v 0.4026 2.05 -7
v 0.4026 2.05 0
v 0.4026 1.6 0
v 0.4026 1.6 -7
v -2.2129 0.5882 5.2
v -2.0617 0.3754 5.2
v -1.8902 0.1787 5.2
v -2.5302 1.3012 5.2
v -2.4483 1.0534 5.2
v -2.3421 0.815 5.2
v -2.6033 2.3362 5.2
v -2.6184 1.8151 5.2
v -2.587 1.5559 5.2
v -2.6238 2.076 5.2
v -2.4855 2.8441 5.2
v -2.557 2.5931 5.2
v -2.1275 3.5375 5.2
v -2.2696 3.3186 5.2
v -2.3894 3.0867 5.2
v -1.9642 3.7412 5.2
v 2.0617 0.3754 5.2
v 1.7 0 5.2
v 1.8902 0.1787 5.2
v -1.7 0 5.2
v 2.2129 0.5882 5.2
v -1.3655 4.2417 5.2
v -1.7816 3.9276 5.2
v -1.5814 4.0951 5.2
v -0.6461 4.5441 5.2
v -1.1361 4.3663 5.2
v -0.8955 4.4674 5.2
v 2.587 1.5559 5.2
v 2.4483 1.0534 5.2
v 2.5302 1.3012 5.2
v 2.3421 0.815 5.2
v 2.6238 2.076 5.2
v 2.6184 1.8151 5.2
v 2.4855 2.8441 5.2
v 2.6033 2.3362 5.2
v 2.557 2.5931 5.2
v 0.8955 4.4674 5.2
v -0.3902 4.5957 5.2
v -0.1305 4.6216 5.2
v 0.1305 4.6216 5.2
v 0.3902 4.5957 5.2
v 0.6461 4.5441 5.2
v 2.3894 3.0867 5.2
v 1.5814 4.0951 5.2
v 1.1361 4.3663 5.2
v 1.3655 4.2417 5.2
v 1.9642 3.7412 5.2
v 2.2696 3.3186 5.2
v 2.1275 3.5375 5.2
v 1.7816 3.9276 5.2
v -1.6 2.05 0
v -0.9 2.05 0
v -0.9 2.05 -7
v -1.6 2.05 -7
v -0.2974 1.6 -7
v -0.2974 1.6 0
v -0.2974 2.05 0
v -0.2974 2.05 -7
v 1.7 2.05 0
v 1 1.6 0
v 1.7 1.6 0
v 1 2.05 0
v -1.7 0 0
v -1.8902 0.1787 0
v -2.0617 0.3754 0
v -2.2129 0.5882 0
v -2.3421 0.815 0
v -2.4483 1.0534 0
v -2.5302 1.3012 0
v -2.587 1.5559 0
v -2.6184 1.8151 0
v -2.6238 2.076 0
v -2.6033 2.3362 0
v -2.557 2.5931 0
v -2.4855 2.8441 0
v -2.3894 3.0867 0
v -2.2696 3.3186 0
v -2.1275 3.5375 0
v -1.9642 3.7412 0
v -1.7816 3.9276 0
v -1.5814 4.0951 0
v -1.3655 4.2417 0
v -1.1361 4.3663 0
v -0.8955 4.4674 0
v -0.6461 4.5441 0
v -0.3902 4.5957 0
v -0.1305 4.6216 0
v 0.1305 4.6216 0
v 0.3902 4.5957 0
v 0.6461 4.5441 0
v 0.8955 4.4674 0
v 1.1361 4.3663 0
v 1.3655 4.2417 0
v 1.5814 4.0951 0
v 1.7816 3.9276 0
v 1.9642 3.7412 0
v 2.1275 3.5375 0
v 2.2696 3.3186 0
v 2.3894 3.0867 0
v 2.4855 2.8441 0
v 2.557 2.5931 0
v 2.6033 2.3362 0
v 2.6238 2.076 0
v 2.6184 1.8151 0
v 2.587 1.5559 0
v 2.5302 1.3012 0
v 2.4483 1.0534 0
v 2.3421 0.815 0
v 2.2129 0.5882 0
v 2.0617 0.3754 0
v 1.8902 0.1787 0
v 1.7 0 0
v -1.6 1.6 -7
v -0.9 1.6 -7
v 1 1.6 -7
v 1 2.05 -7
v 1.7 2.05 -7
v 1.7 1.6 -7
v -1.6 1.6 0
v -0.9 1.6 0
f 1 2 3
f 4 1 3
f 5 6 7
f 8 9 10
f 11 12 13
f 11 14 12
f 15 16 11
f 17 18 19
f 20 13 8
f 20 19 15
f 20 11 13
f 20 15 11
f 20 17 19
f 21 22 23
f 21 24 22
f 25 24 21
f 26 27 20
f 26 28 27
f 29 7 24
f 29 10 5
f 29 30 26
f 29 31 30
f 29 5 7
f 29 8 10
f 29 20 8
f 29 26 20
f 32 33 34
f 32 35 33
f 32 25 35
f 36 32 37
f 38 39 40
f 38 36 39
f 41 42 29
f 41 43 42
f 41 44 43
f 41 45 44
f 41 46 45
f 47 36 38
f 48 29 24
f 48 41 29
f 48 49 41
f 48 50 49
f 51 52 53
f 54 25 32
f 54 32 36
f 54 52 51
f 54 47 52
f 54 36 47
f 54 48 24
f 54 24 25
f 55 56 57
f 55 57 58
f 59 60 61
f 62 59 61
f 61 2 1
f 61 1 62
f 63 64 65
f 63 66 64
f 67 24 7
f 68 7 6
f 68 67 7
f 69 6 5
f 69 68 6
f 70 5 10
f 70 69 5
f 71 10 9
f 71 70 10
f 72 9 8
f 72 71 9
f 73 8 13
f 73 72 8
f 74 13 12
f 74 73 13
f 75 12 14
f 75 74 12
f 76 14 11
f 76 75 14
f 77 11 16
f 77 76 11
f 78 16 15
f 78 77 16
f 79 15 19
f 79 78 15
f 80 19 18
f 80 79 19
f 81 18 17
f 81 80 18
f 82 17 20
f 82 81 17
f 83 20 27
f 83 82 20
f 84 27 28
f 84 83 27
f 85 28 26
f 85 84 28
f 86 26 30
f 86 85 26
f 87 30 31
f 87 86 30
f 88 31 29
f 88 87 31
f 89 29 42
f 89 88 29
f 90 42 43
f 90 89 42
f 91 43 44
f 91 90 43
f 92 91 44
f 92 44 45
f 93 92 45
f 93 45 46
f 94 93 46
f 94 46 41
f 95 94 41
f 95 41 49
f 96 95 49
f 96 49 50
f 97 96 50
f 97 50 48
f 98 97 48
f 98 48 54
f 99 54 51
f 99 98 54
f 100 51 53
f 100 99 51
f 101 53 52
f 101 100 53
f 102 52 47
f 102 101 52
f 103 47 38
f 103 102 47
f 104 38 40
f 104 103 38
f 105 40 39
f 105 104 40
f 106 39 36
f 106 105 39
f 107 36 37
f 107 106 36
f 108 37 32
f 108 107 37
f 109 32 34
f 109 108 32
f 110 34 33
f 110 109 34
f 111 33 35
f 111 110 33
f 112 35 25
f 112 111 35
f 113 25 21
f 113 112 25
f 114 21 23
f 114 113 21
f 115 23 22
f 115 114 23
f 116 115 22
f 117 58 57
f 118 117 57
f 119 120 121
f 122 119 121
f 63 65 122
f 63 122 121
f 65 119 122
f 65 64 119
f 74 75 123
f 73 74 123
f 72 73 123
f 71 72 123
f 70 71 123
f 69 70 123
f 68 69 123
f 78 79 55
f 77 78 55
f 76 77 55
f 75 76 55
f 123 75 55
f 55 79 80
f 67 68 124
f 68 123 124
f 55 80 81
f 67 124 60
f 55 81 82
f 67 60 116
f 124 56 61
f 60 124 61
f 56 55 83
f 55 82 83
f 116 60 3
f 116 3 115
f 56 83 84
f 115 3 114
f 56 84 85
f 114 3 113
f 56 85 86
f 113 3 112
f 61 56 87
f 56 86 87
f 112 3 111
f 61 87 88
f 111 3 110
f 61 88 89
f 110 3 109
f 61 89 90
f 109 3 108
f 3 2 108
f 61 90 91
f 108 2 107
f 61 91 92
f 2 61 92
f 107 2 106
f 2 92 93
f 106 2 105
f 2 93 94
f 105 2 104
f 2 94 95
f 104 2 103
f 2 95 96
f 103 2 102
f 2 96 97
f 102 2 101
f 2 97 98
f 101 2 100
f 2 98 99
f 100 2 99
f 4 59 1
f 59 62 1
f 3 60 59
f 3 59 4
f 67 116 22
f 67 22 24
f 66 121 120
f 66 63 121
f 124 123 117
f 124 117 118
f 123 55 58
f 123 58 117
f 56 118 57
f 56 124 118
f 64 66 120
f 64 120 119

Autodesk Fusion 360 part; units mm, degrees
sketch "Sketch1" plane through (0, 0, 0) normal (0, 0, 1) x (1, 0, 0)
  line L0 (0, 0) -> (-1.725, 0)
  line L1 (-1.725, 0) -> (-1.725, 0.0215)
  line L2 (1.725, 0) -> (1.725, 0.0215)
  line L3 (0, 0) -> (1.725, 0)
  arc A0 (1.7, 0) -> (-1.7, 0) centre (0, 2) ccw
  line L4 (-1.6, 1.6) -> (1.7, 1.6)
  line L5 (1.7, 1.6) -> (1.7, 2.05)
  line L6 (1.7, 2.05) -> (-1.6, 2.05)
  line L7 (-1.6, 2.05) -> (-1.6, 1.6)
  line L8 (-1.6, 1.6) -> (-0.9, 1.6)
  line L9 (-0.9, 1.6) -> (-0.9, 2.05)
  line L10 (-0.9, 2.05) -> (-1.6, 2.05)
  line L11 (-1.6, 2.05) -> (-1.6, 1.6)
  line L12 (1.7, 2.05) -> (1, 2.05)
  line L13 (1, 2.05) -> (1, 1.6)
  line L14 (1, 1.6) -> (1.7, 1.6)
  line L15 (1.7, 1.6) -> (1.7, 2.05)
  line L16 (-0.2974, 2.05) -> (0.4026, 2.05)
  line L17 (0.4026, 2.05) -> (0.4026, 1.6)
  line L18 (0.4026, 1.6) -> (-0.2974, 1.6)
  line L19 (-0.2974, 1.6) -> (-0.2974, 2.05)
  dimension "d7" = 3.3
  dimension "d8" = 0.45
  dimension "d9" = 0.7
  dimension "d10" = 0.7
  dimension "d11" = 0.7
extrude "Extrude2" add sketch "Sketch1" against normal blind 7 contours L4 L5 L6 L12 L13 L14 L15 makes body 1
extrude "Extrude1" add sketch "Sketch1" along normal blind 5.2 separate body contours L0 L3 A0 | L4 L6 L7 L8 L9 L10 L11 | L4 L6 L9 L19 | L4 L6 L16 L17 L18 L19 | L4 L6 L13 L17 | L4 L5 L6 L12 L13 L14 L15 makes body 2
extrude "Extrude3" add sketch "Sketch1" against normal blind 7 contours L4 L6 L16 L17 L18 L19 bodies 2
extrude "Extrude4" add sketch "Sketch1" against normal blind 7 contours L4 L6 L7 L8 L9 L10 L11 bodies 2
sketch "Sketch2" plane through (0, 0, 0) normal (0, -1, 0) x (1, 0, 0)
  line L0 (-1.7, 0) -> (1.7, 0)
  line L1 (1.7, 0) -> (1.7, 5.2)
  line L2 (1.7, 5.2) -> (-1.7, 5.2)
  line L3 (-1.7, 5.2) -> (-1.7, 0)
  line L4 (-1.3801, 3.7908) -> (-1.3801, 4.4908)
  line L5 (-1.3801, 4.4908) -> (-1.1175, 4.4908)
  spline S0 degree 2 poles (-1.1175, 4.4908) (-1.0373, 4.4908) (-0.9888, 4.4696) knots 0 0 0 1 1 1
  spline S1 degree 2 poles (-0.9888, 4.4696) (-0.9403, 4.4483) (-0.9129, 4.4042) knots 0 0 0 1 1 1
  spline S2 degree 2 poles (-0.9129, 4.4042) (-0.8854, 4.36) (-0.8854, 4.3118) knots 0 0 0 1 1 1
  spline S3 degree 2 poles (-0.8854, 4.3118) (-0.8854, 4.2669) (-0.9098, 4.2273) knots 0 0 0 1 1 1
  spline S4 degree 2 poles (-0.9098, 4.2273) (-0.9341, 4.1876) (-0.9833, 4.1633) knots 0 0 0 1 1 1
  spline S5 degree 2 poles (-0.9833, 4.1633) (-0.9198, 4.1447) (-0.8857, 4.0998) knots 0 0 0 1 1 1
  spline S6 degree 2 poles (-0.8857, 4.0998) (-0.8515, 4.0549) (-0.8515, 3.9938) knots 0 0 0 1 1 1
  spline S7 degree 2 poles (-0.8515, 3.9938) (-0.8515, 3.9446) (-0.8723, 3.9023) knots 0 0 0 1 1 1
  spline S8 degree 2 poles (-0.8723, 3.9023) (-0.8931, 3.8601) (-0.9236, 3.8372) knots 0 0 0 1 1 1
  spline S9 degree 2 poles (-0.9236, 3.8372) (-0.9542, 3.8142) (-1.0003, 3.8025) knots 0 0 0 1 1 1
  spline S10 degree 2 poles (-1.0003, 3.8025) (-1.0463, 3.7908) (-1.1132, 3.7908) knots 0 0 0 1 1 1
  line L6 (-1.1132, 3.7908) -> (-1.3801, 3.7908)
  line L7 (-1.2875, 4.1967) -> (-1.1361, 4.1967)
  spline S11 degree 2 poles (-1.1361, 4.1967) (-1.0745, 4.1967) (-1.0478, 4.2048) knots 0 0 0 1 1 1
  spline S12 degree 2 poles (-1.0478, 4.2048) (-1.0124, 4.2153) (-0.9945, 4.2397) knots 0 0 0 1 1 1
  spline S13 degree 2 poles (-0.9945, 4.2397) (-0.9766, 4.264) (-0.9766, 4.3008) knots 0 0 0 1 1 1
  spline S14 degree 2 poles (-0.9766, 4.3008) (-0.9766, 4.3357) (-0.9933, 4.3622) knots 0 0 0 1 1 1
  spline S15 degree 2 poles (-0.9933, 4.3622) (-1.01, 4.3887) (-1.0411, 4.3984) knots 0 0 0 1 1 1
  spline S16 degree 2 poles (-1.0411, 4.3984) (-1.0721, 4.4082) (-1.1476, 4.4082) knots 0 0 0 1 1 1
  line L8 (-1.1476, 4.4082) -> (-1.2875, 4.4082)
  line L9 (-1.2875, 4.4082) -> (-1.2875, 4.1967)
  line L10 (-1.2875, 3.8734) -> (-1.1132, 3.8734)
  spline S17 degree 2 poles (-1.1132, 3.8734) (-1.0683, 3.8734) (-1.0502, 3.8768) knots 0 0 0 1 1 1
  spline S18 degree 2 poles (-1.0502, 3.8768) (-1.0182, 3.8825) (-0.9967, 3.8959) knots 0 0 0 1 1 1
  spline S19 degree 2 poles (-0.9967, 3.8959) (-0.9752, 3.9093) (-0.9613, 3.9348) knots 0 0 0 1 1 1
  spline S20 degree 2 poles (-0.9613, 3.9348) (-0.9475, 3.9603) (-0.9475, 3.9938) knots 0 0 0 1 1 1
  spline S21 degree 2 poles (-0.9475, 3.9938) (-0.9475, 4.0329) (-0.9676, 4.0618) knots 0 0 0 1 1 1
  spline S22 degree 2 poles (-0.9676, 4.0618) (-0.9876, 4.0907) (-1.0232, 4.1024) knots 0 0 0 1 1 1
  spline S23 degree 2 poles (-1.0232, 4.1024) (-1.0588, 4.1141) (-1.1256, 4.1141) knots 0 0 0 1 1 1
  line L11 (-1.1256, 4.1141) -> (-1.2875, 4.1141)
  line L12 (-1.2875, 4.1141) -> (-1.2875, 3.8734)
  line L13 (-0.2246, 4.0363) -> (-0.1319, 4.0129)
  spline S24 degree 2 poles (-0.1319, 4.0129) (-0.1611, 3.8988) (-0.2368, 3.8388) knots 0 0 0 1 1 1
  spline S25 degree 2 poles (-0.2368, 3.8388) (-0.3124, 3.7789) (-0.4218, 3.7789) knots 0 0 0 1 1 1
  spline S26 degree 2 poles (-0.4218, 3.7789) (-0.5349, 3.7789) (-0.6059, 3.825) knots 0 0 0 1 1 1
  spline S27 degree 2 poles (-0.6059, 3.825) (-0.6768, 3.8711) (-0.7138, 3.9584) knots 0 0 0 1 1 1
  spline S28 degree 2 poles (-0.7138, 3.9584) (-0.7508, 4.0458) (-0.7508, 4.1461) knots 0 0 0 1 1 1
  spline S29 degree 2 poles (-0.7508, 4.1461) (-0.7508, 4.2554) (-0.709, 4.3368) knots 0 0 0 1 1 1
  spline S30 degree 2 poles (-0.709, 4.3368) (-0.6672, 4.4183) (-0.5901, 4.4605) knots 0 0 0 1 1 1
  spline S31 degree 2 poles (-0.5901, 4.4605) (-0.513, 4.5028) (-0.4203, 4.5028) knots 0 0 0 1 1 1
  spline S32 degree 2 poles (-0.4203, 4.5028) (-0.3153, 4.5028) (-0.2437, 4.4493) knots 0 0 0 1 1 1
  spline S33 degree 2 poles (-0.2437, 4.4493) (-0.1721, 4.3958) (-0.1439, 4.2989) knots 0 0 0 1 1 1
  line L14 (-0.1439, 4.2989) -> (-0.2351, 4.2774)
  spline S34 degree 2 poles (-0.2351, 4.2774) (-0.2594, 4.3538) (-0.3058, 4.3887) knots 0 0 0 1 1 1
  spline S35 degree 2 poles (-0.3058, 4.3887) (-0.3521, 4.4235) (-0.4223, 4.4235) knots 0 0 0 1 1 1
  spline S36 degree 2 poles (-0.4223, 4.4235) (-0.503, 4.4235) (-0.5571, 4.3848) knots 0 0 0 1 1 1
  spline S37 degree 2 poles (-0.5571, 4.3848) (-0.6113, 4.3462) (-0.6333, 4.281) knots 0 0 0 1 1 1
  spline S38 degree 2 poles (-0.6333, 4.281) (-0.6553, 4.2158) (-0.6553, 4.1466) knots 0 0 0 1 1 1
  spline S39 degree 2 poles (-0.6553, 4.1466) (-0.6553, 4.0573) (-0.6292, 3.9907) knots 0 0 0 1 1 1
  spline S40 degree 2 poles (-0.6292, 3.9907) (-0.6032, 3.9241) (-0.5483, 3.8911) knots 0 0 0 1 1 1
  spline S41 degree 2 poles (-0.5483, 3.8911) (-0.4934, 3.8582) (-0.4294, 3.8582) knots 0 0 0 1 1 1
  spline S42 degree 2 poles (-0.4294, 3.8582) (-0.3516, 3.8582) (-0.2976, 3.903) knots 0 0 0 1 1 1
  spline S43 degree 2 poles (-0.2976, 3.903) (-0.2437, 3.9479) (-0.2246, 4.0363) knots 0 0 0 1 1 1
  line L15 (-0.0522, 3.9756) -> (0.0337, 3.9871)
  spline S44 degree 2 poles (0.0337, 3.9871) (0.0485, 3.914) (0.0841, 3.8818) knots 0 0 0 1 1 1
  spline S45 degree 2 poles (0.0841, 3.8818) (0.1197, 3.8496) (0.1708, 3.8496) knots 0 0 0 1 1 1
  spline S46 degree 2 poles (0.1708, 3.8496) (0.2314, 3.8496) (0.2732, 3.8916) knots 0 0 0 1 1 1
  spline S47 degree 2 poles (0.2732, 3.8916) (0.315, 3.9336) (0.315, 3.9957) knots 0 0 0 1 1 1
  spline S48 degree 2 poles (0.315, 3.9957) (0.315, 4.0549) (0.2763, 4.0933) knots 0 0 0 1 1 1
  spline S49 degree 2 poles (0.2763, 4.0933) (0.2376, 4.1318) (0.1779, 4.1318) knots 0 0 0 1 1 1
  spline S50 degree 2 poles (0.1779, 4.1318) (0.1536, 4.1318) (0.1173, 4.1222) knots 0 0 0 1 1 1
  line L16 (0.1173, 4.1222) -> (0.1269, 4.1977)
  spline S51 degree 2 poles (0.1269, 4.1977) (0.1355, 4.1967) (0.1407, 4.1967) knots 0 0 0 1 1 1
  spline S52 degree 2 poles (0.1407, 4.1967) (0.1956, 4.1967) (0.2395, 4.2254) knots 0 0 0 1 1 1
  spline S53 degree 2 poles (0.2395, 4.2254) (0.2835, 4.254) (0.2835, 4.3137) knots 0 0 0 1 1 1
  spline S54 degree 2 poles (0.2835, 4.3137) (0.2835, 4.361) (0.2515, 4.392) knots 0 0 0 1 1 1
  spline S55 degree 2 poles (0.2515, 4.392) (0.2195, 4.423) (0.1689, 4.423) knots 0 0 0 1 1 1
  spline S56 degree 2 poles (0.1689, 4.423) (0.1187, 4.423) (0.0853, 4.3915) knots 0 0 0 1 1 1
  spline S57 degree 2 poles (0.0853, 4.3915) (0.0519, 4.36) (0.0423, 4.297) knots 0 0 0 1 1 1
  line L17 (0.0423, 4.297) -> (-0.0436, 4.3123)
  spline S58 degree 2 poles (-0.0436, 4.3123) (-0.0279, 4.3987) (0.028, 4.4462) knots 0 0 0 1 1 1
  spline S59 degree 2 poles (0.028, 4.4462) (0.0839, 4.4937) (0.167, 4.4937) knots 0 0 0 1 1 1
  spline S60 degree 2 poles (0.167, 4.4937) (0.2243, 4.4937) (0.2725, 4.4691) knots 0 0 0 1 1 1
  spline S61 degree 2 poles (0.2725, 4.4691) (0.3207, 4.4445) (0.3463, 4.402) knots 0 0 0 1 1 1
  spline S62 degree 2 poles (0.3463, 4.402) (0.3718, 4.3595) (0.3718, 4.3118) knots 0 0 0 1 1 1
  spline S63 degree 2 poles (0.3718, 4.3118) (0.3718, 4.2664) (0.3475, 4.2292) knots 0 0 0 1 1 1
  spline S64 degree 2 poles (0.3475, 4.2292) (0.3231, 4.1919) (0.2754, 4.17) knots 0 0 0 1 1 1
  spline S65 degree 2 poles (0.2754, 4.17) (0.3374, 4.1556) (0.3718, 4.1105) knots 0 0 0 1 1 1
  spline S66 degree 2 poles (0.3718, 4.1105) (0.4062, 4.0654) (0.4062, 3.9976) knots 0 0 0 1 1 1
  spline S67 degree 2 poles (0.4062, 3.9976) (0.4062, 3.9059) (0.3393, 3.8422) knots 0 0 0 1 1 1
  spline S68 degree 2 poles (0.3393, 3.8422) (0.2725, 3.7784) (0.1703, 3.7784) knots 0 0 0 1 1 1
  spline S69 degree 2 poles (0.1703, 3.7784) (0.0782, 3.7784) (0.0173, 3.8333) knots 0 0 0 1 1 1
  spline S70 degree 2 poles (0.0173, 3.8333) (-0.0436, 3.8882) (-0.0522, 3.9756) knots 0 0 0 1 1 1
  line L18 (0.4917, 3.9756) -> (0.5776, 3.9871)
  spline S71 degree 2 poles (0.5776, 3.9871) (0.5924, 3.914) (0.628, 3.8818) knots 0 0 0 1 1 1
  spline S72 degree 2 poles (0.628, 3.8818) (0.6636, 3.8496) (0.7146, 3.8496) knots 0 0 0 1 1 1
  spline S73 degree 2 poles (0.7146, 3.8496) (0.7753, 3.8496) (0.8171, 3.8916) knots 0 0 0 1 1 1
  spline S74 degree 2 poles (0.8171, 3.8916) (0.8588, 3.9336) (0.8588, 3.9957) knots 0 0 0 1 1 1
  spline S75 degree 2 poles (0.8588, 3.9957) (0.8588, 4.0549) (0.8202, 4.0933) knots 0 0 0 1 1 1
  spline S76 degree 2 poles (0.8202, 4.0933) (0.7815, 4.1318) (0.7218, 4.1318) knots 0 0 0 1 1 1
  spline S77 degree 2 poles (0.7218, 4.1318) (0.6975, 4.1318) (0.6612, 4.1222) knots 0 0 0 1 1 1
  line L19 (0.6612, 4.1222) -> (0.6707, 4.1977)
  spline S78 degree 2 poles (0.6707, 4.1977) (0.6793, 4.1967) (0.6846, 4.1967) knots 0 0 0 1 1 1
  spline S79 degree 2 poles (0.6846, 4.1967) (0.7395, 4.1967) (0.7834, 4.2254) knots 0 0 0 1 1 1
  spline S80 degree 2 poles (0.7834, 4.2254) (0.8273, 4.254) (0.8273, 4.3137) knots 0 0 0 1 1 1
  spline S81 degree 2 poles (0.8273, 4.3137) (0.8273, 4.361) (0.7953, 4.392) knots 0 0 0 1 1 1
  spline S82 degree 2 poles (0.7953, 4.392) (0.7633, 4.423) (0.7127, 4.423) knots 0 0 0 1 1 1
  spline S83 degree 2 poles (0.7127, 4.423) (0.6626, 4.423) (0.6292, 4.3915) knots 0 0 0 1 1 1
  spline S84 degree 2 poles (0.6292, 4.3915) (0.5958, 4.36) (0.5862, 4.297) knots 0 0 0 1 1 1
  line L20 (0.5862, 4.297) -> (0.5003, 4.3123)
  spline S85 degree 2 poles (0.5003, 4.3123) (0.516, 4.3987) (0.5719, 4.4462) knots 0 0 0 1 1 1
  spline S86 degree 2 poles (0.5719, 4.4462) (0.6277, 4.4937) (0.7108, 4.4937) knots 0 0 0 1 1 1
  spline S87 degree 2 poles (0.7108, 4.4937) (0.7681, 4.4937) (0.8164, 4.4691) knots 0 0 0 1 1 1
  spline S88 degree 2 poles (0.8164, 4.4691) (0.8646, 4.4445) (0.8901, 4.402) knots 0 0 0 1 1 1
  spline S89 degree 2 poles (0.8901, 4.402) (0.9157, 4.3595) (0.9157, 4.3118) knots 0 0 0 1 1 1
  spline S90 degree 2 poles (0.9157, 4.3118) (0.9157, 4.2664) (0.8913, 4.2292) knots 0 0 0 1 1 1
  spline S91 degree 2 poles (0.8913, 4.2292) (0.867, 4.1919) (0.8192, 4.17) knots 0 0 0 1 1 1
  spline S92 degree 2 poles (0.8192, 4.17) (0.8813, 4.1556) (0.9157, 4.1105) knots 0 0 0 1 1 1
  spline S93 degree 2 poles (0.9157, 4.1105) (0.95, 4.0654) (0.95, 3.9976) knots 0 0 0 1 1 1
  spline S94 degree 2 poles (0.95, 3.9976) (0.95, 3.9059) (0.8832, 3.8422) knots 0 0 0 1 1 1
  spline S95 degree 2 poles (0.8832, 3.8422) (0.8164, 3.7784) (0.7142, 3.7784) knots 0 0 0 1 1 1
  spline S96 degree 2 poles (0.7142, 3.7784) (0.622, 3.7784) (0.5611, 3.8333) knots 0 0 0 1 1 1
  spline S97 degree 2 poles (0.5611, 3.8333) (0.5003, 3.8882) (0.4917, 3.9756) knots 0 0 0 1 1 1
  line L21 (1.0408, 4.3992) -> (1.0408, 4.4818)
  line L22 (1.0408, 4.4818) -> (1.4939, 4.4818)
  line L23 (1.4939, 4.4818) -> (1.4939, 4.4149)
  spline S98 degree 2 poles (1.4939, 4.4149) (1.4271, 4.3438) (1.3614, 4.2258) knots 0 0 0 1 1 1
  spline S99 degree 2 poles (1.3614, 4.2258) (1.2958, 4.1079) (1.2599, 3.9833) knots 0 0 0 1 1 1
  spline S100 degree 2 poles (1.2599, 3.9833) (1.2342, 3.8954) (1.227, 3.7908) knots 0 0 0 1 1 1
  line L24 (1.227, 3.7908) -> (1.1387, 3.7908)
  spline S101 degree 2 poles (1.1387, 3.7908) (1.1401, 3.8734) (1.1711, 3.9904) knots 0 0 0 1 1 1
  spline S102 degree 2 poles (1.1711, 3.9904) (1.2022, 4.1074) (1.2602, 4.216) knots 0 0 0 1 1 1
  spline S103 degree 2 poles (1.2602, 4.216) (1.3182, 4.3247) (1.3836, 4.3992) knots 0 0 0 1 1 1
  line L25 (1.3836, 4.3992) -> (1.0408, 4.3992)
